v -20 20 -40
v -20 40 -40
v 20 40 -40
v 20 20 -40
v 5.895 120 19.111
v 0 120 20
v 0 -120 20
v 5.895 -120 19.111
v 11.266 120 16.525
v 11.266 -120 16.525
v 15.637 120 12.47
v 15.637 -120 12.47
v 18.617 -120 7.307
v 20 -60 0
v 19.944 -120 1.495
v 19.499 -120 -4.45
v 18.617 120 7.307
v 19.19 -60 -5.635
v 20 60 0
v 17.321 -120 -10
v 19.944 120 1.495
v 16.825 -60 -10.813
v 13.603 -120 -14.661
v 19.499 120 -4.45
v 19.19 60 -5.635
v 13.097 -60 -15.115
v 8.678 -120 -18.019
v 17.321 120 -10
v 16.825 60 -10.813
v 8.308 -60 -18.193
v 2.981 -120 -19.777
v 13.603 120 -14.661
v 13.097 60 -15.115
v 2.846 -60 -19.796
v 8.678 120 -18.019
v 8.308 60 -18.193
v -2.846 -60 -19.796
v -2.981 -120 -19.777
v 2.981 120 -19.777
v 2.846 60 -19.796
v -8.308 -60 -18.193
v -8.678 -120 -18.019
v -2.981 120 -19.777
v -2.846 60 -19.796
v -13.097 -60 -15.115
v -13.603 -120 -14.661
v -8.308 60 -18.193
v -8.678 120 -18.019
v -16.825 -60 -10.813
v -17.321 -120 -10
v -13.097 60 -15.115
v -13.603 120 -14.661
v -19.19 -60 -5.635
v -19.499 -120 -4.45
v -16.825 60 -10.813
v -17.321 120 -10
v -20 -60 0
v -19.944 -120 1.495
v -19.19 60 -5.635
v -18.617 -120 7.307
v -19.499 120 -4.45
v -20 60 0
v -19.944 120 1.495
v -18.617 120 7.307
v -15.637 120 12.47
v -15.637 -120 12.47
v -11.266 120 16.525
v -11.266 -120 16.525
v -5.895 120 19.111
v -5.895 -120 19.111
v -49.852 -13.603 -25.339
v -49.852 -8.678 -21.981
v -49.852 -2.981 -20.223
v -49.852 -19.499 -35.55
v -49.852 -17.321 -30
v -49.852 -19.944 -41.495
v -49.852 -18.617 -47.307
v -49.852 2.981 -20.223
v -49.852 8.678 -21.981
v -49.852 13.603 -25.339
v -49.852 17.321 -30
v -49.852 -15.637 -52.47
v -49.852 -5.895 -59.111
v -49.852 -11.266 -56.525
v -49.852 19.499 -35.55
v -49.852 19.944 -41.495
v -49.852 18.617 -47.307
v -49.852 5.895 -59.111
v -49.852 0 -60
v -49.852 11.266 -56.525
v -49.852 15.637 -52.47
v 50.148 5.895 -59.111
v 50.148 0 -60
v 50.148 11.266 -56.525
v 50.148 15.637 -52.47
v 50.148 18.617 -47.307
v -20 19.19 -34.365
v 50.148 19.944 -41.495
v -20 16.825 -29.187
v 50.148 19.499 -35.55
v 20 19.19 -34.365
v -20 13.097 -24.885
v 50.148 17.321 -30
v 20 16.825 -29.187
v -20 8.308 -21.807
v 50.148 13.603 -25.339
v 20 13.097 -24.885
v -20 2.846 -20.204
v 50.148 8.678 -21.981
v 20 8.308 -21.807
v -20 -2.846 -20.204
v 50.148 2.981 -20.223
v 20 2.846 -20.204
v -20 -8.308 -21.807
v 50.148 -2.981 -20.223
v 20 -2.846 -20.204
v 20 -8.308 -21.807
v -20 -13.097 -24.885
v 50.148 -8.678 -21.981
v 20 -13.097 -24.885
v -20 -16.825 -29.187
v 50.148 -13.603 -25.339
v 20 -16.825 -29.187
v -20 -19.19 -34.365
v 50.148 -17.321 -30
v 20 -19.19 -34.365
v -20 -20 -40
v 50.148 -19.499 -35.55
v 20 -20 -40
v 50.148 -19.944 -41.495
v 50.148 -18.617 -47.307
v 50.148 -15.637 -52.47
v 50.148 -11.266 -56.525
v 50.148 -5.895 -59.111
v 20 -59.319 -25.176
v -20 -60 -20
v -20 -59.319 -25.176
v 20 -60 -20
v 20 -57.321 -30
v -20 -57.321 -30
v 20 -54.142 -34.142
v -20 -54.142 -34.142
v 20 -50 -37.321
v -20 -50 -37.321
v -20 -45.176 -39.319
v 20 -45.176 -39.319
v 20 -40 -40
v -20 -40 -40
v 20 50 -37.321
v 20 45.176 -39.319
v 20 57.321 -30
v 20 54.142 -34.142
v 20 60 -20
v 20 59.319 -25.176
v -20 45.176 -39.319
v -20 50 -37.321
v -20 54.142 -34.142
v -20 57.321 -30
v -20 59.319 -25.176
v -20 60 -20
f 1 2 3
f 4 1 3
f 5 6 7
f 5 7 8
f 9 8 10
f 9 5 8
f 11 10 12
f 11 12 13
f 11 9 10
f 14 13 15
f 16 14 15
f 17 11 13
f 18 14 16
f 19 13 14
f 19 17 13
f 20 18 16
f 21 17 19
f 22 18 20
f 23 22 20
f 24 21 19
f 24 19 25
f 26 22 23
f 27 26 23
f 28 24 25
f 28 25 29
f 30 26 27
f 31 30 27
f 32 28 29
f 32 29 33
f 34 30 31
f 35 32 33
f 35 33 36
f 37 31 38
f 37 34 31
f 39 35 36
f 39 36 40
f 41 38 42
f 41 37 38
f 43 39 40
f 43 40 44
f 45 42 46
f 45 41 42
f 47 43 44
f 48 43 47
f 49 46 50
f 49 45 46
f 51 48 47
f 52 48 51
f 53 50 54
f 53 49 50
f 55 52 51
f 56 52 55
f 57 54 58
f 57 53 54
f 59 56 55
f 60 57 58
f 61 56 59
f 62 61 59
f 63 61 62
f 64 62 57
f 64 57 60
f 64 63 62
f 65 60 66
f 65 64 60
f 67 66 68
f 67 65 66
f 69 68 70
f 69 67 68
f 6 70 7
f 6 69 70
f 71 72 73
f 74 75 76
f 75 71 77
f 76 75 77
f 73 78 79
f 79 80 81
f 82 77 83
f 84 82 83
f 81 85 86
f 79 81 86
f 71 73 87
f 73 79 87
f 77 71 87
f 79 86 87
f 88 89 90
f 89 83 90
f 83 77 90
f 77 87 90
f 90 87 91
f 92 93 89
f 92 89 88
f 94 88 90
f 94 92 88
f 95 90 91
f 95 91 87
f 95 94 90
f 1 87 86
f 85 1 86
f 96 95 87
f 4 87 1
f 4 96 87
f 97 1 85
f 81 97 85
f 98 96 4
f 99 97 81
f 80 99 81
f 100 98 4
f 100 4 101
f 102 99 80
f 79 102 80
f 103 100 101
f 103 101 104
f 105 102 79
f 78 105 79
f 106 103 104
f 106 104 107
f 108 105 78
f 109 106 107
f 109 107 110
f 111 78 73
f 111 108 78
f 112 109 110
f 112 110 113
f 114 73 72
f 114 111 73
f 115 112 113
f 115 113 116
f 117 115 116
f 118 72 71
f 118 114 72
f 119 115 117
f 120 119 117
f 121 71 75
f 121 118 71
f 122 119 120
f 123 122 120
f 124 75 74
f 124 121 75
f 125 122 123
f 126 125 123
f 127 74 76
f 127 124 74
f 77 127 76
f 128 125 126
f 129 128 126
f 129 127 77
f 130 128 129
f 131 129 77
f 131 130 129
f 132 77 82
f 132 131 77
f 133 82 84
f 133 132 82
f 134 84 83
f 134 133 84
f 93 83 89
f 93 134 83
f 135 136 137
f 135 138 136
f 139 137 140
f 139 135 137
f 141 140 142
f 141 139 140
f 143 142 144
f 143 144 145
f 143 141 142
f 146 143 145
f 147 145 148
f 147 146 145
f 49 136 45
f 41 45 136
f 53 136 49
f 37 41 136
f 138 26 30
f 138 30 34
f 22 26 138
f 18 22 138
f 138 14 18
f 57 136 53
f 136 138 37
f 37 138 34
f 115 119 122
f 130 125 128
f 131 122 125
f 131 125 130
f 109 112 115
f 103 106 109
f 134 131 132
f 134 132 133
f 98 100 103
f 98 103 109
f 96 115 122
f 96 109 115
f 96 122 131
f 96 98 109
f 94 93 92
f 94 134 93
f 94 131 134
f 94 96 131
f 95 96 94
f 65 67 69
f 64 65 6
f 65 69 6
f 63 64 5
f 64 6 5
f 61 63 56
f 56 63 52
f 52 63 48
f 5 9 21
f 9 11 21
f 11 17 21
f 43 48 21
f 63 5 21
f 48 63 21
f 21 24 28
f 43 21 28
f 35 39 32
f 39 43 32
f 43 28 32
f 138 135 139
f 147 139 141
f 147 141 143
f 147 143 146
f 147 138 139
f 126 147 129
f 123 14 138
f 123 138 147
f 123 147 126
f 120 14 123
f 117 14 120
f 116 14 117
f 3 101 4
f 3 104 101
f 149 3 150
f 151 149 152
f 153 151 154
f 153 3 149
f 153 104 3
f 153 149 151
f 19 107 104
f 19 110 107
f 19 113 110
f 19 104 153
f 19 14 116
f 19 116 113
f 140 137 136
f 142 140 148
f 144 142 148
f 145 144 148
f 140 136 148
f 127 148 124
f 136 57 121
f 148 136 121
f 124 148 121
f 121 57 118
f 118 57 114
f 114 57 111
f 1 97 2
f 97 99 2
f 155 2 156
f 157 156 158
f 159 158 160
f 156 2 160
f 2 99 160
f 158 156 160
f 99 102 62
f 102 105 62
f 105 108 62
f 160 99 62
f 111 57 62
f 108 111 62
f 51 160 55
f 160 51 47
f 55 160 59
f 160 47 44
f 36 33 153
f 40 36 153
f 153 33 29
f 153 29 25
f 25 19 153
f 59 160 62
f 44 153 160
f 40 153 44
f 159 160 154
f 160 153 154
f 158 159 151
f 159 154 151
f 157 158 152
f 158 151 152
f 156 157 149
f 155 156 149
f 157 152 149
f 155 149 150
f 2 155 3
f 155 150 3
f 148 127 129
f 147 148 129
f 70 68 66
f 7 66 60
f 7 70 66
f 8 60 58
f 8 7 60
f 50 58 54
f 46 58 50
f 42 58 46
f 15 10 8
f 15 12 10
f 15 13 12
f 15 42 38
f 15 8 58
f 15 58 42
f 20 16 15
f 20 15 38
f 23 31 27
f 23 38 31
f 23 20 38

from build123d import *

# Parameters (mm, degrees)
F0_W     = 240
F0_H     = 20
F2_W     = 40
F2_H     = 120
F3_DEPTH = 40
F4_R     = 19.99999
F5_W     = 100
F5_H     = 20


# Not quite as in the source:
# - a fillet or chamfer is up to 0.001 mm smaller than in the source, because OpenCascade refuses the exact size


with BuildPart() as f1:
    # F0 (on Right) → F1 (revolve)
    with BuildSketch(Plane.YZ):
        with Locations((0, 10)):
            Rectangle(F0_W, F0_H)
    revolve(axis=Axis((0, 0, 0), (0, 1, 0)))

    # F2 (on Top) → F3 (join)
    with BuildSketch(Plane.XY):
        Rectangle(F2_W, F2_H)
    extrude(amount=-F3_DEPTH)

    # F4 (radius 20 in the source; OpenCascade refuses exactly that, so slightly less here)
    f4_edges = [f1.edges().sort_by_distance(p)[0] for p in [
        (0, -60, -40),
        (0, 60, -40),
    ]]
    fillet(f4_edges, radius=F4_R)

    # F5 (on Front) → F6 (revolve)
    with BuildSketch(Plane.XZ):
        with Locations((0.1484978533, -50)):
            Rectangle(F5_W, F5_H)
    revolve(axis=Axis((43.9392195031, 0, -40), (1, 0, 0)))


solid = f1.part
